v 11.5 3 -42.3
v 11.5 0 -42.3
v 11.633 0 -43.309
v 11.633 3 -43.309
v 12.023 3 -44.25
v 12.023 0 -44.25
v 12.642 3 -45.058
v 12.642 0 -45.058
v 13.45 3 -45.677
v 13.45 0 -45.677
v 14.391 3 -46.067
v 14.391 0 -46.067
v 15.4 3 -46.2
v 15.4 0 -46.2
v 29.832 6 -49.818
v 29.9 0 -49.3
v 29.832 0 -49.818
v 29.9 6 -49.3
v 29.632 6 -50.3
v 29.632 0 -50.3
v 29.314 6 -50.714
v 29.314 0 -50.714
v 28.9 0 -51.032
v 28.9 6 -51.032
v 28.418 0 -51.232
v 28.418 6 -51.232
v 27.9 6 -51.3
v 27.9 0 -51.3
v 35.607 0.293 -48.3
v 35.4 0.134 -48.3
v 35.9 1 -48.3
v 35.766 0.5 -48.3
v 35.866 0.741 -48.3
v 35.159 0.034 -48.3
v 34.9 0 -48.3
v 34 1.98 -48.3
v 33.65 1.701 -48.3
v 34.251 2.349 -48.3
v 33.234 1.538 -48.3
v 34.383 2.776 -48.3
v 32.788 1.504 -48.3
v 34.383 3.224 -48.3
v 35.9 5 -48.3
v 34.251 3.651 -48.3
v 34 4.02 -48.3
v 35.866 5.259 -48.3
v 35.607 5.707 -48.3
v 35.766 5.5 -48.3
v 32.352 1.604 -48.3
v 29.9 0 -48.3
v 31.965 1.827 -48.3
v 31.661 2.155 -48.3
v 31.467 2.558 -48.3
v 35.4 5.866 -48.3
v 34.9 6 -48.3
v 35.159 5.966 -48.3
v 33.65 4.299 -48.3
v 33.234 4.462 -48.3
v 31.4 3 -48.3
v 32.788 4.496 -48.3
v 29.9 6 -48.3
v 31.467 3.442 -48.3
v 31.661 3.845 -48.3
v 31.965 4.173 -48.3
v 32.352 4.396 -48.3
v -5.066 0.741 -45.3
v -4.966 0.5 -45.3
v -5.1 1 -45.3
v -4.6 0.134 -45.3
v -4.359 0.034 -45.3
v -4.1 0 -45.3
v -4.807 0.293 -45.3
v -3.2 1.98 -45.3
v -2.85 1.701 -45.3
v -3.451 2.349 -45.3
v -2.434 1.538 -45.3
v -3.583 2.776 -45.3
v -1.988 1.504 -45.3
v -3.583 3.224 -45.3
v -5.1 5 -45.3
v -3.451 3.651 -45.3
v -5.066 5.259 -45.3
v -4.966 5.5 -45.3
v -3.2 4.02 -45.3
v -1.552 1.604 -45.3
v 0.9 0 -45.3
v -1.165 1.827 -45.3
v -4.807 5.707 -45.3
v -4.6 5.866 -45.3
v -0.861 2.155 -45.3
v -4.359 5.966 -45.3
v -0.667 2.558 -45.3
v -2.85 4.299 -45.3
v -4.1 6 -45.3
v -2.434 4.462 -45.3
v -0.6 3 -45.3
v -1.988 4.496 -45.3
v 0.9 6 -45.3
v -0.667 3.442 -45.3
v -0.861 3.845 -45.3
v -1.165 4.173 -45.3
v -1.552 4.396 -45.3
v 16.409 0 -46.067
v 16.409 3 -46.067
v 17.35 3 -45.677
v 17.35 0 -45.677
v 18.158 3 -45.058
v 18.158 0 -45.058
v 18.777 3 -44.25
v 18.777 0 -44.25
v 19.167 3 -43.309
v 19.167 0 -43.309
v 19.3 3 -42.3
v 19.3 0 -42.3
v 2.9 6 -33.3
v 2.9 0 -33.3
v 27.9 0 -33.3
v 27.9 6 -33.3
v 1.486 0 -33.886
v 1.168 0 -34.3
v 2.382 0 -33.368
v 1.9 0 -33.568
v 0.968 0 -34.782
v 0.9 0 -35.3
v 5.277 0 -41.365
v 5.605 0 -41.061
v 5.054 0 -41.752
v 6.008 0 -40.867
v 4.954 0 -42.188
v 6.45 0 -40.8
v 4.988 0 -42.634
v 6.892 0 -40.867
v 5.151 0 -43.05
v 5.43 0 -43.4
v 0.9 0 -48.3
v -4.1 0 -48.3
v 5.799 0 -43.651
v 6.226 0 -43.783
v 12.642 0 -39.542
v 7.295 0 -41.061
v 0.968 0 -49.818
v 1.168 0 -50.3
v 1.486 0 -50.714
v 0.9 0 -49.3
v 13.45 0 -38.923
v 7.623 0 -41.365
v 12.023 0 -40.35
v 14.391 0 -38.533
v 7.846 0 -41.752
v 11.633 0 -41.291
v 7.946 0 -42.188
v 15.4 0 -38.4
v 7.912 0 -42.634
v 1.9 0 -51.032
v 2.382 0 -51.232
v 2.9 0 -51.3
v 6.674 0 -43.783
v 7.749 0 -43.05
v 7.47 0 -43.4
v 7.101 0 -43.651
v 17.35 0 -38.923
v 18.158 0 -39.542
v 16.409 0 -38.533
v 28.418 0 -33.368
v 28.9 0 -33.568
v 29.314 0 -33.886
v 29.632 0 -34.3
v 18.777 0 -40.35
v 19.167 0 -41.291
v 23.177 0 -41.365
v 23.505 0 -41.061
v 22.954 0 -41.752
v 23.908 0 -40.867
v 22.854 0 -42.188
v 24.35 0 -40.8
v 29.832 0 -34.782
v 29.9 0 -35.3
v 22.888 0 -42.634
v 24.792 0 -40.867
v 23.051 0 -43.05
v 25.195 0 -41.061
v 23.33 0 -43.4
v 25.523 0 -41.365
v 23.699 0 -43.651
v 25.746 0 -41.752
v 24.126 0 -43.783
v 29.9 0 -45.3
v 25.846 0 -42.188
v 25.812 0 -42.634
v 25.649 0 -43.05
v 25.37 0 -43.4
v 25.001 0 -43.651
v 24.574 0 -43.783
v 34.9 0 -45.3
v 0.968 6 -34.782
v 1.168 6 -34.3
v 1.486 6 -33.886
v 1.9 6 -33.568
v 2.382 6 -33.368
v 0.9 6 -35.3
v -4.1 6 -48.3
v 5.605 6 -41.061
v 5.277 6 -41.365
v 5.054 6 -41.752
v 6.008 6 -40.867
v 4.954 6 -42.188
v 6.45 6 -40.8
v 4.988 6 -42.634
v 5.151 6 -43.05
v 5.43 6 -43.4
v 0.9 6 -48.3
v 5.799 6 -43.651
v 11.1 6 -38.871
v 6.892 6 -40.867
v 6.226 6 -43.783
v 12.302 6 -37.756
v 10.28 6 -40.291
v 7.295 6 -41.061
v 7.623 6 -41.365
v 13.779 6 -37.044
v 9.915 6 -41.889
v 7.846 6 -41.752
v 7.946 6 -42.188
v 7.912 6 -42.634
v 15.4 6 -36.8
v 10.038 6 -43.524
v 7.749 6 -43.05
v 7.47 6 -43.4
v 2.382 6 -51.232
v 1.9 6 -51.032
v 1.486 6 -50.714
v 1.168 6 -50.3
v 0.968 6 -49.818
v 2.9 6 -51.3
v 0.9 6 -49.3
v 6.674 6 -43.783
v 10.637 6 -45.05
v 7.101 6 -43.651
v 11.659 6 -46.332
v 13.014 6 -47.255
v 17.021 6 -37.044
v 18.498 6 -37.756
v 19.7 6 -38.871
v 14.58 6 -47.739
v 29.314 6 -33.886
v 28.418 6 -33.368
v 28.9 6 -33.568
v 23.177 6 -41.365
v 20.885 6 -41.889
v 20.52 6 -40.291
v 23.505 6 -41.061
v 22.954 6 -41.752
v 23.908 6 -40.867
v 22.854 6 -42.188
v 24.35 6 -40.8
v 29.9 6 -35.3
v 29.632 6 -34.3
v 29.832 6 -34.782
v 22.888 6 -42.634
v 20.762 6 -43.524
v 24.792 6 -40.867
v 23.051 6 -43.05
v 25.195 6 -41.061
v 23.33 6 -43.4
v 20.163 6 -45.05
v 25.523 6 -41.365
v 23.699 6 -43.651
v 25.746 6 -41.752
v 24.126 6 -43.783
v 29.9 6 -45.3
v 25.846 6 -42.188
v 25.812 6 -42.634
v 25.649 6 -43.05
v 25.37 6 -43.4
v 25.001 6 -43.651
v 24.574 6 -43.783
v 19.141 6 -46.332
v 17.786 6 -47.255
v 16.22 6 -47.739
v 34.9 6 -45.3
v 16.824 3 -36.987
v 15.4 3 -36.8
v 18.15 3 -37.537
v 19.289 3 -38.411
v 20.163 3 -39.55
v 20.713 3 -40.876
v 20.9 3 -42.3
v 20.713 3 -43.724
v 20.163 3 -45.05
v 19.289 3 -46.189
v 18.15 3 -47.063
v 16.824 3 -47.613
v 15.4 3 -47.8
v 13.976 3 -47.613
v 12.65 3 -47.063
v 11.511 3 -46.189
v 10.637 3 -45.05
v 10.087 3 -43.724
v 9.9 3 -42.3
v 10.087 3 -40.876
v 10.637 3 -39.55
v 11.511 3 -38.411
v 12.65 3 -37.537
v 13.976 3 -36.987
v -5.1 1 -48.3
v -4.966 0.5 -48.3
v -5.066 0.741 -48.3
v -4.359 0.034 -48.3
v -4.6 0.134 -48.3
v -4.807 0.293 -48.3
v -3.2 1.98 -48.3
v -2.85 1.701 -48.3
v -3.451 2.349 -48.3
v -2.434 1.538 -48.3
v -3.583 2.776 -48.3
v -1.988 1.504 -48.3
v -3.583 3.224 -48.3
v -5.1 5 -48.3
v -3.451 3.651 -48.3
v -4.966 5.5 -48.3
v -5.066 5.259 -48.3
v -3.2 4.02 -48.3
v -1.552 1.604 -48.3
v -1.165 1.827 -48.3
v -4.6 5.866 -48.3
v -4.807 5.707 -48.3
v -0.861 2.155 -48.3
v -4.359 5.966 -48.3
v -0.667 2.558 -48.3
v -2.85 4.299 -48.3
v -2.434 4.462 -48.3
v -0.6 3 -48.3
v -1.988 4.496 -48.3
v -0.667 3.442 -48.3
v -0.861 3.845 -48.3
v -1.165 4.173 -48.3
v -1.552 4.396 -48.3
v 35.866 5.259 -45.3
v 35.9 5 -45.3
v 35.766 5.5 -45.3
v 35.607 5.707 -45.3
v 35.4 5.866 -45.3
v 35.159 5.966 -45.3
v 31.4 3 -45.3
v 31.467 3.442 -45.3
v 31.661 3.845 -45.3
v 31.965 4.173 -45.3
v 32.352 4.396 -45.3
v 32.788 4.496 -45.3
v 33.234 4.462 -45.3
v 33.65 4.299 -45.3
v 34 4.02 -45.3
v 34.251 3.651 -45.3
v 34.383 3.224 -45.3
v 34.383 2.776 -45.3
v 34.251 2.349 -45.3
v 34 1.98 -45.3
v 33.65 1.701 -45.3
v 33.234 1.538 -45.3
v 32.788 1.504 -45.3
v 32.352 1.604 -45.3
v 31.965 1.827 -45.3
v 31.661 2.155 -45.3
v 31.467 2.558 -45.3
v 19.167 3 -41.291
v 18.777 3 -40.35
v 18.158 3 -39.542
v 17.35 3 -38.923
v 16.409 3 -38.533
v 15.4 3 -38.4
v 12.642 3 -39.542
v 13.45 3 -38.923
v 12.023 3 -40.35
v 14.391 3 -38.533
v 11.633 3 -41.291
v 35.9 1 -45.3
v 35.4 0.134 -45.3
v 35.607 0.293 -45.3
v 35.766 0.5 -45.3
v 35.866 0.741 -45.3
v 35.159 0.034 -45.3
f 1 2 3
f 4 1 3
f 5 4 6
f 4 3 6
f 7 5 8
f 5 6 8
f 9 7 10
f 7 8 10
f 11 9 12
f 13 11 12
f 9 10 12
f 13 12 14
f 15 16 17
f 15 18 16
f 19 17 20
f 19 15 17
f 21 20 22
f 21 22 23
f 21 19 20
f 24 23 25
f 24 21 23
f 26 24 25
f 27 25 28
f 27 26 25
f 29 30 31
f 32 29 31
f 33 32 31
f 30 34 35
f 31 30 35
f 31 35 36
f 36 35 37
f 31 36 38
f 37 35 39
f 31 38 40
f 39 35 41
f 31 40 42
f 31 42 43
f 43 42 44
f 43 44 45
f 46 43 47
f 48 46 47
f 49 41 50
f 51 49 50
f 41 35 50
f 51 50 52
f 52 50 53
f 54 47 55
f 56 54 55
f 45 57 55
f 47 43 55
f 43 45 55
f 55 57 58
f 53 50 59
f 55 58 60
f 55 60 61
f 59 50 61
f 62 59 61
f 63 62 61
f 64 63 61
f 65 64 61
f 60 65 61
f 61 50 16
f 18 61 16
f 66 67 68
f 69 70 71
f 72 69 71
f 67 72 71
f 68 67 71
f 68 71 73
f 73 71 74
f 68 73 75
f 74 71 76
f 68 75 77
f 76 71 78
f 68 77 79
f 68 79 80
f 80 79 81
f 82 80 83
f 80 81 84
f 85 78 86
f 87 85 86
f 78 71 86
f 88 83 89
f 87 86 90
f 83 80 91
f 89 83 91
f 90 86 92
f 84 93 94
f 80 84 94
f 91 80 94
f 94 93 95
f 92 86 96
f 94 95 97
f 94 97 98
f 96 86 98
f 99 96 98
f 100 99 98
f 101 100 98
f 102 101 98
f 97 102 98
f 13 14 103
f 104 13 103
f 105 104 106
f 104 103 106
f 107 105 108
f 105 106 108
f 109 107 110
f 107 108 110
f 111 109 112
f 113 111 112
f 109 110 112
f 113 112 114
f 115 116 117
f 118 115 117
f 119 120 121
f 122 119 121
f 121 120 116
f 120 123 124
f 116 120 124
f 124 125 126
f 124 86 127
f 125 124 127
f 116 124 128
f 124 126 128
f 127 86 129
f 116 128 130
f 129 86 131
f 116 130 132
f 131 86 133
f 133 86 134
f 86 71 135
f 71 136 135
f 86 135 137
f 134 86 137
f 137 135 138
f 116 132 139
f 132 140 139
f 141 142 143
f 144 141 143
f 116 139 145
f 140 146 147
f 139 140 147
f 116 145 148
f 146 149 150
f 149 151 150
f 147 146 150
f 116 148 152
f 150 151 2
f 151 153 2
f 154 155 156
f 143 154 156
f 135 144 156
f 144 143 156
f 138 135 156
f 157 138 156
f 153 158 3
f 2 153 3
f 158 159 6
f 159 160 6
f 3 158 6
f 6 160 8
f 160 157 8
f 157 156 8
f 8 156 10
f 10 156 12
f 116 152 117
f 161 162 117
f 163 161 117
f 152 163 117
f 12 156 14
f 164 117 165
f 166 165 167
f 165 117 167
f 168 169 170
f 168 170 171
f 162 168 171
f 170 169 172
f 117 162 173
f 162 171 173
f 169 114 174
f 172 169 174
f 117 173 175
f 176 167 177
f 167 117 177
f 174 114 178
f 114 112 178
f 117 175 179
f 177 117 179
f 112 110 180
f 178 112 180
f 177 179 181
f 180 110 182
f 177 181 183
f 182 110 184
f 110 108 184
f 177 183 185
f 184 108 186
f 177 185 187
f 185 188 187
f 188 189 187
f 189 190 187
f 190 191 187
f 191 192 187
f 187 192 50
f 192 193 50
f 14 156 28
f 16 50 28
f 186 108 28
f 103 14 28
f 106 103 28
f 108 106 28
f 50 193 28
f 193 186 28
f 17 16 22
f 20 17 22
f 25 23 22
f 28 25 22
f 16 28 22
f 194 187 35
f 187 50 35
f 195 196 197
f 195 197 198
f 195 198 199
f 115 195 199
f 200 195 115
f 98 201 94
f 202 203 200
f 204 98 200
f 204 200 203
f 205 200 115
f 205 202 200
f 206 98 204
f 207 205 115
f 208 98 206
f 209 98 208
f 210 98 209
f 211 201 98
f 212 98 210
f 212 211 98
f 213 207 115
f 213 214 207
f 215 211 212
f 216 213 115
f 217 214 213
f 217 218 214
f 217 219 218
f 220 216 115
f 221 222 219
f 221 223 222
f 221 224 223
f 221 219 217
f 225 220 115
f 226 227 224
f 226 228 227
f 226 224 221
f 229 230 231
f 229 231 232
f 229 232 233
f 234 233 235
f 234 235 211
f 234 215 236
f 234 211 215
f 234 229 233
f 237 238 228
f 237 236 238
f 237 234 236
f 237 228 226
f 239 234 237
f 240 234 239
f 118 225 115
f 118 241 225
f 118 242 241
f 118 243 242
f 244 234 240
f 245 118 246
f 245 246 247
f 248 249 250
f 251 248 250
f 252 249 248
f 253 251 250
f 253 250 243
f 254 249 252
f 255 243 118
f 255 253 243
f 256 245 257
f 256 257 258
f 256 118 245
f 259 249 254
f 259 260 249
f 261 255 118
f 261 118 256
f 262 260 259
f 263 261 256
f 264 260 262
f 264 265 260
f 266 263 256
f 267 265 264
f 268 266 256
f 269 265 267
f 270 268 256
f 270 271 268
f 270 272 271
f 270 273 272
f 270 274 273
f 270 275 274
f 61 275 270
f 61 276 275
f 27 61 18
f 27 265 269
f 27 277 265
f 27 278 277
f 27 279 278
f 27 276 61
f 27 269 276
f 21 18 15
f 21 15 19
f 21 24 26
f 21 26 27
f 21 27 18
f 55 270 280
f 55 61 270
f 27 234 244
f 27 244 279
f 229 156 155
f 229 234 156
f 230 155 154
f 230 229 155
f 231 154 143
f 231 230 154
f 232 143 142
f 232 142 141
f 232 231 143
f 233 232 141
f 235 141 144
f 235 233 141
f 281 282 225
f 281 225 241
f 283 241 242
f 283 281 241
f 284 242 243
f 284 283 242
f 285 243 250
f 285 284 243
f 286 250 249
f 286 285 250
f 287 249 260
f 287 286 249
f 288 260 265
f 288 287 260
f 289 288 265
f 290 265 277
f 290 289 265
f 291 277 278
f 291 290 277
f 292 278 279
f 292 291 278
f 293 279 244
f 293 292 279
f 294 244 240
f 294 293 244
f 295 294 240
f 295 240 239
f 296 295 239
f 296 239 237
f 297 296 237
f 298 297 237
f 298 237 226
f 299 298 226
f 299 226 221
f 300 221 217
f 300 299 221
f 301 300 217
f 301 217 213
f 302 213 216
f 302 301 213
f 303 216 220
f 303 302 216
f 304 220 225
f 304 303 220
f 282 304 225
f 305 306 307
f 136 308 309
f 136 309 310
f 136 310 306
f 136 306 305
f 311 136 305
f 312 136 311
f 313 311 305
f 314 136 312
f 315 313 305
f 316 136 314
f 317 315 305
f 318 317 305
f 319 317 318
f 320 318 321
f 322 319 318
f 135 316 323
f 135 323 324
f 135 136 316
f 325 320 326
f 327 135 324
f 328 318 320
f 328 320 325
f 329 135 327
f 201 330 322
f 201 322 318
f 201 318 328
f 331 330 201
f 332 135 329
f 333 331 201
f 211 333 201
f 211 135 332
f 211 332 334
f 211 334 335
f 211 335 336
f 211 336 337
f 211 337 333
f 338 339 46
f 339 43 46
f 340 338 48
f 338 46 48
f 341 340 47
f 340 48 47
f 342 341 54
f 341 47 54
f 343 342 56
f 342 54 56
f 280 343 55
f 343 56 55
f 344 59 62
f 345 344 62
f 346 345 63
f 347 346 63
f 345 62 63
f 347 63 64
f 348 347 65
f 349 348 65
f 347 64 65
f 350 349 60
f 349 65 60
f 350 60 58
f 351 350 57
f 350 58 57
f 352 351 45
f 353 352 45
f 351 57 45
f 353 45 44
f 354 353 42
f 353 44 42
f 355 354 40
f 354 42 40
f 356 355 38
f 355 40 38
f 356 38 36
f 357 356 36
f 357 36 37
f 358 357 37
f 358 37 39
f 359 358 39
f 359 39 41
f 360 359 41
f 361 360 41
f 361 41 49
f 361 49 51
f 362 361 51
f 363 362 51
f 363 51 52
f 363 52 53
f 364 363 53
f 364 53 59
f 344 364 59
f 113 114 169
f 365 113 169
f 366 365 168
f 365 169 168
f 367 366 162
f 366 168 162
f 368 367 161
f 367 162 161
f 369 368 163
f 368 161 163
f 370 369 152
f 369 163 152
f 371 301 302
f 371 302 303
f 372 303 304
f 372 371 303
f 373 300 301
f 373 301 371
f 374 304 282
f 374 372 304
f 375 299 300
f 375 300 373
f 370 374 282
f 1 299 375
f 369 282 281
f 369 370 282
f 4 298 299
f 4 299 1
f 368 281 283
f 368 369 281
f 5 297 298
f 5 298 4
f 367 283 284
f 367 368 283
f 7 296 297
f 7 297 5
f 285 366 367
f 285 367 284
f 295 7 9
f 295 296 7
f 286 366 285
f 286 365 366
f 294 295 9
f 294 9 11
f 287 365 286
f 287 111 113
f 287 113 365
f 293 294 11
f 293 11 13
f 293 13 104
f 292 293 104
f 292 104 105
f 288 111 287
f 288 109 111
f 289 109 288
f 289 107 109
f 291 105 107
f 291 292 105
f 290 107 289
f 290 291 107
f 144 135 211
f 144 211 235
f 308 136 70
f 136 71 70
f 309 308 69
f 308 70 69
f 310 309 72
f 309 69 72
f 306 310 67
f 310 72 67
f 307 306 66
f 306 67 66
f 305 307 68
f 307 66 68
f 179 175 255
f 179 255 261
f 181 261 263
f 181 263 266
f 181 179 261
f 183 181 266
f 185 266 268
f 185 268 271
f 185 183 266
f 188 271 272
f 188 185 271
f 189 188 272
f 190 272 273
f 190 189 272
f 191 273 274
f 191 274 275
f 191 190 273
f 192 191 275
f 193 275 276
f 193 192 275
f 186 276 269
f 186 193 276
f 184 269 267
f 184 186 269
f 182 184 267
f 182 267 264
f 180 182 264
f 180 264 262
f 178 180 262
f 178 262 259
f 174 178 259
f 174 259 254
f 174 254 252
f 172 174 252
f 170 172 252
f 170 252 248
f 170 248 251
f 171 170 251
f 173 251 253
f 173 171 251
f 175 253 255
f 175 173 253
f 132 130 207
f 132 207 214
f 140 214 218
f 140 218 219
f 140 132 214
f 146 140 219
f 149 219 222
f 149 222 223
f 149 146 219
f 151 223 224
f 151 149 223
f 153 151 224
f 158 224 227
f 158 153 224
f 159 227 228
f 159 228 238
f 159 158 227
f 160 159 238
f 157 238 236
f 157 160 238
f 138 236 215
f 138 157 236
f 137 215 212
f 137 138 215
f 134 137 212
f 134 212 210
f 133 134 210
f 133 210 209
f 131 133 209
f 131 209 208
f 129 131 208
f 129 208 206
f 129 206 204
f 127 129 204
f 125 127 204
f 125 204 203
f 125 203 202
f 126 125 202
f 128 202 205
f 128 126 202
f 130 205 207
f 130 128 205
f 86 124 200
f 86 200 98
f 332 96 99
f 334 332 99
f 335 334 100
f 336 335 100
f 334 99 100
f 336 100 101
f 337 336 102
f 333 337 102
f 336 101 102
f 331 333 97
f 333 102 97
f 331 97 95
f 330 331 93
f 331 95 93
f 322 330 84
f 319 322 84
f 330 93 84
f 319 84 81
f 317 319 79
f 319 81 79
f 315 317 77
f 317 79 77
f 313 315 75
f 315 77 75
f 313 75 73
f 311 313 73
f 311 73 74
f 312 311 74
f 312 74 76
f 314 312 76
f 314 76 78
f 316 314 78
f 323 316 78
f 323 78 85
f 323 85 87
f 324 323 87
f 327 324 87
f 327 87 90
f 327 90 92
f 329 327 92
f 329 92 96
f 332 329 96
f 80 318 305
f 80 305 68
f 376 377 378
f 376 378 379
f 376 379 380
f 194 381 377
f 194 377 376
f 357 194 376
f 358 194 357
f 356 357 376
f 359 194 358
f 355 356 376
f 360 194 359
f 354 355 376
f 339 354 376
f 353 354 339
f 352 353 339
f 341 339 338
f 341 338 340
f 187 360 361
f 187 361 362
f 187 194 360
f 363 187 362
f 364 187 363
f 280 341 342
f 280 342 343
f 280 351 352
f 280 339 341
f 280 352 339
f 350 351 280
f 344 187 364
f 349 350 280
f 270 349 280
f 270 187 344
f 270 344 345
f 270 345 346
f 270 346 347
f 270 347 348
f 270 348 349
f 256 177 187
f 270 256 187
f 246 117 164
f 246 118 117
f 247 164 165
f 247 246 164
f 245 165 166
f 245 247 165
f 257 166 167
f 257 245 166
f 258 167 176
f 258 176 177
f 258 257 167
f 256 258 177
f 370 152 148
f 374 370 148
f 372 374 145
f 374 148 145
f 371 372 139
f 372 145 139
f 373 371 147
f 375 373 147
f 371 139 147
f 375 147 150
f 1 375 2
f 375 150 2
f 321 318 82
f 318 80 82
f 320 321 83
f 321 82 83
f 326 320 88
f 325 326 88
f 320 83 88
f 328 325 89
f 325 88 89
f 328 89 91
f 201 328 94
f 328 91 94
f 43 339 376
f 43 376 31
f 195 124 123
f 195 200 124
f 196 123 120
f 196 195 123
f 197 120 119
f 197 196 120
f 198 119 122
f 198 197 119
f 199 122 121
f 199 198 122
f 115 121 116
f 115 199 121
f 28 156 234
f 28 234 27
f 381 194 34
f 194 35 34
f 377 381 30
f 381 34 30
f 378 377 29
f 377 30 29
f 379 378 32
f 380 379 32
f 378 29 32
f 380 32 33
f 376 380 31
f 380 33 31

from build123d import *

# Parameters (mm, degrees)
SKETCH_1_W          = 29
SKETCH_1_H          = 18
SKETCH_1_R          = 5.5
SKETCH_1_R_2        = 1.5
EXTRUDE_1_DEPTH     = 6
SKETCH_1_6_R        = 5.5
SKETCH_1_6_R_2      = 3.9
EXTRUDE_2_DEPTH     = 3
SKETCH_2_W          = 3
SKETCH_2_H          = 6
EXTRUDE_3_DEPTH     = 6
SKETCH_4_R          = 1.5
CUT_EXTRUDE_1_DEPTH = 6
SKETCH_5_W          = 3
SKETCH_5_H          = 6
EXTRUDE_4_DEPTH     = 6
SKETCH_7_R          = 1.5
CUT_EXTRUDE_2_DEPTH = 6
FILLET_1_R          = 2
FILLET_3_R          = 1


with BuildPart() as part:
    # 草图1 → 凸台-拉伸1 (new body)
    with BuildSketch(Plane(origin=(0, 0, 0), x_dir=(1, 0, 0), z_dir=(0, 1, 0))):
        with Locations((15.4, 42.3)):
            Rectangle(SKETCH_1_W, SKETCH_1_H)
        with Locations((15.4, 42.3)):
            Circle(SKETCH_1_R, mode=Mode.SUBTRACT)
        with Locations((24.35, 42.3)):
            Circle(SKETCH_1_R_2, mode=Mode.SUBTRACT)
        with Locations((6.45, 42.3)):
            Circle(SKETCH_1_R_2, mode=Mode.SUBTRACT)
    extrude(amount=EXTRUDE_1_DEPTH)

    # 草图1<6> → 凸台-拉伸2 (add)
    with BuildSketch(Plane(origin=(0, 0, 0), x_dir=(1, 0, 0), z_dir=(0, 1, 0))):
        with Locations((15.4, 42.3)):
            Circle(SKETCH_1_6_R)
        with Locations((15.4, 42.3)):
            Circle(SKETCH_1_6_R_2, mode=Mode.SUBTRACT)
    extrude(amount=EXTRUDE_2_DEPTH)

    # 草图2 → 凸台-拉伸3 (add)
    with BuildSketch(Plane.ZY.offset(-0.9)):
        with Locations((-46.8, 3)):
            Rectangle(SKETCH_2_W, SKETCH_2_H)
    extrude(amount=EXTRUDE_3_DEPTH)

    # 草图4 → 切除-拉伸1 (cut)
    with BuildSketch(Plane.XY.offset(-45.3)):
        with Locations((-2.1, 3)):
            Circle(SKETCH_4_R)
    extrude(amount=-CUT_EXTRUDE_1_DEPTH, mode=Mode.SUBTRACT)

    # 草图5 → 凸台-拉伸4 (add)
    with BuildSketch(Plane(origin=(29.9, 0, 0), x_dir=(0, 0, -1), z_dir=(1, 0, 0))):
        with Locations((46.8, 3)):
            Rectangle(SKETCH_5_W, SKETCH_5_H)
    extrude(amount=EXTRUDE_4_DEPTH)

    # 草图7 → 切除-拉伸2 (cut)
    with BuildSketch(Plane(origin=(0, 0, -48.3), x_dir=(-1, 0, 0), z_dir=(0, 0, -1))):
        with Locations((-32.9, 3)):
            Circle(SKETCH_7_R)
    extrude(amount=-CUT_EXTRUDE_2_DEPTH, mode=Mode.SUBTRACT)

    # 圆角1
    fillet_1_edges = [part.edges().sort_by_distance(p)[0] for p in [
        (29.9, 3, -33.3),
        (0.9, 3, -33.3),
        (0.9, 3, -51.3),
        (29.9, 3, -51.3),
    ]]
    fillet(fillet_1_edges, radius=FILLET_1_R)

    # 圆角3
    fillet_3_edges = [part.edges().sort_by_distance(p)[0] for p in [
        (35.9, 6, -46.8),
        (35.9, 0, -46.8),
        (-5.1, 0, -46.8),
        (-5.1, 6, -46.8),
    ]]
    fillet(fillet_3_edges, radius=FILLET_3_R)


solid = part.part
